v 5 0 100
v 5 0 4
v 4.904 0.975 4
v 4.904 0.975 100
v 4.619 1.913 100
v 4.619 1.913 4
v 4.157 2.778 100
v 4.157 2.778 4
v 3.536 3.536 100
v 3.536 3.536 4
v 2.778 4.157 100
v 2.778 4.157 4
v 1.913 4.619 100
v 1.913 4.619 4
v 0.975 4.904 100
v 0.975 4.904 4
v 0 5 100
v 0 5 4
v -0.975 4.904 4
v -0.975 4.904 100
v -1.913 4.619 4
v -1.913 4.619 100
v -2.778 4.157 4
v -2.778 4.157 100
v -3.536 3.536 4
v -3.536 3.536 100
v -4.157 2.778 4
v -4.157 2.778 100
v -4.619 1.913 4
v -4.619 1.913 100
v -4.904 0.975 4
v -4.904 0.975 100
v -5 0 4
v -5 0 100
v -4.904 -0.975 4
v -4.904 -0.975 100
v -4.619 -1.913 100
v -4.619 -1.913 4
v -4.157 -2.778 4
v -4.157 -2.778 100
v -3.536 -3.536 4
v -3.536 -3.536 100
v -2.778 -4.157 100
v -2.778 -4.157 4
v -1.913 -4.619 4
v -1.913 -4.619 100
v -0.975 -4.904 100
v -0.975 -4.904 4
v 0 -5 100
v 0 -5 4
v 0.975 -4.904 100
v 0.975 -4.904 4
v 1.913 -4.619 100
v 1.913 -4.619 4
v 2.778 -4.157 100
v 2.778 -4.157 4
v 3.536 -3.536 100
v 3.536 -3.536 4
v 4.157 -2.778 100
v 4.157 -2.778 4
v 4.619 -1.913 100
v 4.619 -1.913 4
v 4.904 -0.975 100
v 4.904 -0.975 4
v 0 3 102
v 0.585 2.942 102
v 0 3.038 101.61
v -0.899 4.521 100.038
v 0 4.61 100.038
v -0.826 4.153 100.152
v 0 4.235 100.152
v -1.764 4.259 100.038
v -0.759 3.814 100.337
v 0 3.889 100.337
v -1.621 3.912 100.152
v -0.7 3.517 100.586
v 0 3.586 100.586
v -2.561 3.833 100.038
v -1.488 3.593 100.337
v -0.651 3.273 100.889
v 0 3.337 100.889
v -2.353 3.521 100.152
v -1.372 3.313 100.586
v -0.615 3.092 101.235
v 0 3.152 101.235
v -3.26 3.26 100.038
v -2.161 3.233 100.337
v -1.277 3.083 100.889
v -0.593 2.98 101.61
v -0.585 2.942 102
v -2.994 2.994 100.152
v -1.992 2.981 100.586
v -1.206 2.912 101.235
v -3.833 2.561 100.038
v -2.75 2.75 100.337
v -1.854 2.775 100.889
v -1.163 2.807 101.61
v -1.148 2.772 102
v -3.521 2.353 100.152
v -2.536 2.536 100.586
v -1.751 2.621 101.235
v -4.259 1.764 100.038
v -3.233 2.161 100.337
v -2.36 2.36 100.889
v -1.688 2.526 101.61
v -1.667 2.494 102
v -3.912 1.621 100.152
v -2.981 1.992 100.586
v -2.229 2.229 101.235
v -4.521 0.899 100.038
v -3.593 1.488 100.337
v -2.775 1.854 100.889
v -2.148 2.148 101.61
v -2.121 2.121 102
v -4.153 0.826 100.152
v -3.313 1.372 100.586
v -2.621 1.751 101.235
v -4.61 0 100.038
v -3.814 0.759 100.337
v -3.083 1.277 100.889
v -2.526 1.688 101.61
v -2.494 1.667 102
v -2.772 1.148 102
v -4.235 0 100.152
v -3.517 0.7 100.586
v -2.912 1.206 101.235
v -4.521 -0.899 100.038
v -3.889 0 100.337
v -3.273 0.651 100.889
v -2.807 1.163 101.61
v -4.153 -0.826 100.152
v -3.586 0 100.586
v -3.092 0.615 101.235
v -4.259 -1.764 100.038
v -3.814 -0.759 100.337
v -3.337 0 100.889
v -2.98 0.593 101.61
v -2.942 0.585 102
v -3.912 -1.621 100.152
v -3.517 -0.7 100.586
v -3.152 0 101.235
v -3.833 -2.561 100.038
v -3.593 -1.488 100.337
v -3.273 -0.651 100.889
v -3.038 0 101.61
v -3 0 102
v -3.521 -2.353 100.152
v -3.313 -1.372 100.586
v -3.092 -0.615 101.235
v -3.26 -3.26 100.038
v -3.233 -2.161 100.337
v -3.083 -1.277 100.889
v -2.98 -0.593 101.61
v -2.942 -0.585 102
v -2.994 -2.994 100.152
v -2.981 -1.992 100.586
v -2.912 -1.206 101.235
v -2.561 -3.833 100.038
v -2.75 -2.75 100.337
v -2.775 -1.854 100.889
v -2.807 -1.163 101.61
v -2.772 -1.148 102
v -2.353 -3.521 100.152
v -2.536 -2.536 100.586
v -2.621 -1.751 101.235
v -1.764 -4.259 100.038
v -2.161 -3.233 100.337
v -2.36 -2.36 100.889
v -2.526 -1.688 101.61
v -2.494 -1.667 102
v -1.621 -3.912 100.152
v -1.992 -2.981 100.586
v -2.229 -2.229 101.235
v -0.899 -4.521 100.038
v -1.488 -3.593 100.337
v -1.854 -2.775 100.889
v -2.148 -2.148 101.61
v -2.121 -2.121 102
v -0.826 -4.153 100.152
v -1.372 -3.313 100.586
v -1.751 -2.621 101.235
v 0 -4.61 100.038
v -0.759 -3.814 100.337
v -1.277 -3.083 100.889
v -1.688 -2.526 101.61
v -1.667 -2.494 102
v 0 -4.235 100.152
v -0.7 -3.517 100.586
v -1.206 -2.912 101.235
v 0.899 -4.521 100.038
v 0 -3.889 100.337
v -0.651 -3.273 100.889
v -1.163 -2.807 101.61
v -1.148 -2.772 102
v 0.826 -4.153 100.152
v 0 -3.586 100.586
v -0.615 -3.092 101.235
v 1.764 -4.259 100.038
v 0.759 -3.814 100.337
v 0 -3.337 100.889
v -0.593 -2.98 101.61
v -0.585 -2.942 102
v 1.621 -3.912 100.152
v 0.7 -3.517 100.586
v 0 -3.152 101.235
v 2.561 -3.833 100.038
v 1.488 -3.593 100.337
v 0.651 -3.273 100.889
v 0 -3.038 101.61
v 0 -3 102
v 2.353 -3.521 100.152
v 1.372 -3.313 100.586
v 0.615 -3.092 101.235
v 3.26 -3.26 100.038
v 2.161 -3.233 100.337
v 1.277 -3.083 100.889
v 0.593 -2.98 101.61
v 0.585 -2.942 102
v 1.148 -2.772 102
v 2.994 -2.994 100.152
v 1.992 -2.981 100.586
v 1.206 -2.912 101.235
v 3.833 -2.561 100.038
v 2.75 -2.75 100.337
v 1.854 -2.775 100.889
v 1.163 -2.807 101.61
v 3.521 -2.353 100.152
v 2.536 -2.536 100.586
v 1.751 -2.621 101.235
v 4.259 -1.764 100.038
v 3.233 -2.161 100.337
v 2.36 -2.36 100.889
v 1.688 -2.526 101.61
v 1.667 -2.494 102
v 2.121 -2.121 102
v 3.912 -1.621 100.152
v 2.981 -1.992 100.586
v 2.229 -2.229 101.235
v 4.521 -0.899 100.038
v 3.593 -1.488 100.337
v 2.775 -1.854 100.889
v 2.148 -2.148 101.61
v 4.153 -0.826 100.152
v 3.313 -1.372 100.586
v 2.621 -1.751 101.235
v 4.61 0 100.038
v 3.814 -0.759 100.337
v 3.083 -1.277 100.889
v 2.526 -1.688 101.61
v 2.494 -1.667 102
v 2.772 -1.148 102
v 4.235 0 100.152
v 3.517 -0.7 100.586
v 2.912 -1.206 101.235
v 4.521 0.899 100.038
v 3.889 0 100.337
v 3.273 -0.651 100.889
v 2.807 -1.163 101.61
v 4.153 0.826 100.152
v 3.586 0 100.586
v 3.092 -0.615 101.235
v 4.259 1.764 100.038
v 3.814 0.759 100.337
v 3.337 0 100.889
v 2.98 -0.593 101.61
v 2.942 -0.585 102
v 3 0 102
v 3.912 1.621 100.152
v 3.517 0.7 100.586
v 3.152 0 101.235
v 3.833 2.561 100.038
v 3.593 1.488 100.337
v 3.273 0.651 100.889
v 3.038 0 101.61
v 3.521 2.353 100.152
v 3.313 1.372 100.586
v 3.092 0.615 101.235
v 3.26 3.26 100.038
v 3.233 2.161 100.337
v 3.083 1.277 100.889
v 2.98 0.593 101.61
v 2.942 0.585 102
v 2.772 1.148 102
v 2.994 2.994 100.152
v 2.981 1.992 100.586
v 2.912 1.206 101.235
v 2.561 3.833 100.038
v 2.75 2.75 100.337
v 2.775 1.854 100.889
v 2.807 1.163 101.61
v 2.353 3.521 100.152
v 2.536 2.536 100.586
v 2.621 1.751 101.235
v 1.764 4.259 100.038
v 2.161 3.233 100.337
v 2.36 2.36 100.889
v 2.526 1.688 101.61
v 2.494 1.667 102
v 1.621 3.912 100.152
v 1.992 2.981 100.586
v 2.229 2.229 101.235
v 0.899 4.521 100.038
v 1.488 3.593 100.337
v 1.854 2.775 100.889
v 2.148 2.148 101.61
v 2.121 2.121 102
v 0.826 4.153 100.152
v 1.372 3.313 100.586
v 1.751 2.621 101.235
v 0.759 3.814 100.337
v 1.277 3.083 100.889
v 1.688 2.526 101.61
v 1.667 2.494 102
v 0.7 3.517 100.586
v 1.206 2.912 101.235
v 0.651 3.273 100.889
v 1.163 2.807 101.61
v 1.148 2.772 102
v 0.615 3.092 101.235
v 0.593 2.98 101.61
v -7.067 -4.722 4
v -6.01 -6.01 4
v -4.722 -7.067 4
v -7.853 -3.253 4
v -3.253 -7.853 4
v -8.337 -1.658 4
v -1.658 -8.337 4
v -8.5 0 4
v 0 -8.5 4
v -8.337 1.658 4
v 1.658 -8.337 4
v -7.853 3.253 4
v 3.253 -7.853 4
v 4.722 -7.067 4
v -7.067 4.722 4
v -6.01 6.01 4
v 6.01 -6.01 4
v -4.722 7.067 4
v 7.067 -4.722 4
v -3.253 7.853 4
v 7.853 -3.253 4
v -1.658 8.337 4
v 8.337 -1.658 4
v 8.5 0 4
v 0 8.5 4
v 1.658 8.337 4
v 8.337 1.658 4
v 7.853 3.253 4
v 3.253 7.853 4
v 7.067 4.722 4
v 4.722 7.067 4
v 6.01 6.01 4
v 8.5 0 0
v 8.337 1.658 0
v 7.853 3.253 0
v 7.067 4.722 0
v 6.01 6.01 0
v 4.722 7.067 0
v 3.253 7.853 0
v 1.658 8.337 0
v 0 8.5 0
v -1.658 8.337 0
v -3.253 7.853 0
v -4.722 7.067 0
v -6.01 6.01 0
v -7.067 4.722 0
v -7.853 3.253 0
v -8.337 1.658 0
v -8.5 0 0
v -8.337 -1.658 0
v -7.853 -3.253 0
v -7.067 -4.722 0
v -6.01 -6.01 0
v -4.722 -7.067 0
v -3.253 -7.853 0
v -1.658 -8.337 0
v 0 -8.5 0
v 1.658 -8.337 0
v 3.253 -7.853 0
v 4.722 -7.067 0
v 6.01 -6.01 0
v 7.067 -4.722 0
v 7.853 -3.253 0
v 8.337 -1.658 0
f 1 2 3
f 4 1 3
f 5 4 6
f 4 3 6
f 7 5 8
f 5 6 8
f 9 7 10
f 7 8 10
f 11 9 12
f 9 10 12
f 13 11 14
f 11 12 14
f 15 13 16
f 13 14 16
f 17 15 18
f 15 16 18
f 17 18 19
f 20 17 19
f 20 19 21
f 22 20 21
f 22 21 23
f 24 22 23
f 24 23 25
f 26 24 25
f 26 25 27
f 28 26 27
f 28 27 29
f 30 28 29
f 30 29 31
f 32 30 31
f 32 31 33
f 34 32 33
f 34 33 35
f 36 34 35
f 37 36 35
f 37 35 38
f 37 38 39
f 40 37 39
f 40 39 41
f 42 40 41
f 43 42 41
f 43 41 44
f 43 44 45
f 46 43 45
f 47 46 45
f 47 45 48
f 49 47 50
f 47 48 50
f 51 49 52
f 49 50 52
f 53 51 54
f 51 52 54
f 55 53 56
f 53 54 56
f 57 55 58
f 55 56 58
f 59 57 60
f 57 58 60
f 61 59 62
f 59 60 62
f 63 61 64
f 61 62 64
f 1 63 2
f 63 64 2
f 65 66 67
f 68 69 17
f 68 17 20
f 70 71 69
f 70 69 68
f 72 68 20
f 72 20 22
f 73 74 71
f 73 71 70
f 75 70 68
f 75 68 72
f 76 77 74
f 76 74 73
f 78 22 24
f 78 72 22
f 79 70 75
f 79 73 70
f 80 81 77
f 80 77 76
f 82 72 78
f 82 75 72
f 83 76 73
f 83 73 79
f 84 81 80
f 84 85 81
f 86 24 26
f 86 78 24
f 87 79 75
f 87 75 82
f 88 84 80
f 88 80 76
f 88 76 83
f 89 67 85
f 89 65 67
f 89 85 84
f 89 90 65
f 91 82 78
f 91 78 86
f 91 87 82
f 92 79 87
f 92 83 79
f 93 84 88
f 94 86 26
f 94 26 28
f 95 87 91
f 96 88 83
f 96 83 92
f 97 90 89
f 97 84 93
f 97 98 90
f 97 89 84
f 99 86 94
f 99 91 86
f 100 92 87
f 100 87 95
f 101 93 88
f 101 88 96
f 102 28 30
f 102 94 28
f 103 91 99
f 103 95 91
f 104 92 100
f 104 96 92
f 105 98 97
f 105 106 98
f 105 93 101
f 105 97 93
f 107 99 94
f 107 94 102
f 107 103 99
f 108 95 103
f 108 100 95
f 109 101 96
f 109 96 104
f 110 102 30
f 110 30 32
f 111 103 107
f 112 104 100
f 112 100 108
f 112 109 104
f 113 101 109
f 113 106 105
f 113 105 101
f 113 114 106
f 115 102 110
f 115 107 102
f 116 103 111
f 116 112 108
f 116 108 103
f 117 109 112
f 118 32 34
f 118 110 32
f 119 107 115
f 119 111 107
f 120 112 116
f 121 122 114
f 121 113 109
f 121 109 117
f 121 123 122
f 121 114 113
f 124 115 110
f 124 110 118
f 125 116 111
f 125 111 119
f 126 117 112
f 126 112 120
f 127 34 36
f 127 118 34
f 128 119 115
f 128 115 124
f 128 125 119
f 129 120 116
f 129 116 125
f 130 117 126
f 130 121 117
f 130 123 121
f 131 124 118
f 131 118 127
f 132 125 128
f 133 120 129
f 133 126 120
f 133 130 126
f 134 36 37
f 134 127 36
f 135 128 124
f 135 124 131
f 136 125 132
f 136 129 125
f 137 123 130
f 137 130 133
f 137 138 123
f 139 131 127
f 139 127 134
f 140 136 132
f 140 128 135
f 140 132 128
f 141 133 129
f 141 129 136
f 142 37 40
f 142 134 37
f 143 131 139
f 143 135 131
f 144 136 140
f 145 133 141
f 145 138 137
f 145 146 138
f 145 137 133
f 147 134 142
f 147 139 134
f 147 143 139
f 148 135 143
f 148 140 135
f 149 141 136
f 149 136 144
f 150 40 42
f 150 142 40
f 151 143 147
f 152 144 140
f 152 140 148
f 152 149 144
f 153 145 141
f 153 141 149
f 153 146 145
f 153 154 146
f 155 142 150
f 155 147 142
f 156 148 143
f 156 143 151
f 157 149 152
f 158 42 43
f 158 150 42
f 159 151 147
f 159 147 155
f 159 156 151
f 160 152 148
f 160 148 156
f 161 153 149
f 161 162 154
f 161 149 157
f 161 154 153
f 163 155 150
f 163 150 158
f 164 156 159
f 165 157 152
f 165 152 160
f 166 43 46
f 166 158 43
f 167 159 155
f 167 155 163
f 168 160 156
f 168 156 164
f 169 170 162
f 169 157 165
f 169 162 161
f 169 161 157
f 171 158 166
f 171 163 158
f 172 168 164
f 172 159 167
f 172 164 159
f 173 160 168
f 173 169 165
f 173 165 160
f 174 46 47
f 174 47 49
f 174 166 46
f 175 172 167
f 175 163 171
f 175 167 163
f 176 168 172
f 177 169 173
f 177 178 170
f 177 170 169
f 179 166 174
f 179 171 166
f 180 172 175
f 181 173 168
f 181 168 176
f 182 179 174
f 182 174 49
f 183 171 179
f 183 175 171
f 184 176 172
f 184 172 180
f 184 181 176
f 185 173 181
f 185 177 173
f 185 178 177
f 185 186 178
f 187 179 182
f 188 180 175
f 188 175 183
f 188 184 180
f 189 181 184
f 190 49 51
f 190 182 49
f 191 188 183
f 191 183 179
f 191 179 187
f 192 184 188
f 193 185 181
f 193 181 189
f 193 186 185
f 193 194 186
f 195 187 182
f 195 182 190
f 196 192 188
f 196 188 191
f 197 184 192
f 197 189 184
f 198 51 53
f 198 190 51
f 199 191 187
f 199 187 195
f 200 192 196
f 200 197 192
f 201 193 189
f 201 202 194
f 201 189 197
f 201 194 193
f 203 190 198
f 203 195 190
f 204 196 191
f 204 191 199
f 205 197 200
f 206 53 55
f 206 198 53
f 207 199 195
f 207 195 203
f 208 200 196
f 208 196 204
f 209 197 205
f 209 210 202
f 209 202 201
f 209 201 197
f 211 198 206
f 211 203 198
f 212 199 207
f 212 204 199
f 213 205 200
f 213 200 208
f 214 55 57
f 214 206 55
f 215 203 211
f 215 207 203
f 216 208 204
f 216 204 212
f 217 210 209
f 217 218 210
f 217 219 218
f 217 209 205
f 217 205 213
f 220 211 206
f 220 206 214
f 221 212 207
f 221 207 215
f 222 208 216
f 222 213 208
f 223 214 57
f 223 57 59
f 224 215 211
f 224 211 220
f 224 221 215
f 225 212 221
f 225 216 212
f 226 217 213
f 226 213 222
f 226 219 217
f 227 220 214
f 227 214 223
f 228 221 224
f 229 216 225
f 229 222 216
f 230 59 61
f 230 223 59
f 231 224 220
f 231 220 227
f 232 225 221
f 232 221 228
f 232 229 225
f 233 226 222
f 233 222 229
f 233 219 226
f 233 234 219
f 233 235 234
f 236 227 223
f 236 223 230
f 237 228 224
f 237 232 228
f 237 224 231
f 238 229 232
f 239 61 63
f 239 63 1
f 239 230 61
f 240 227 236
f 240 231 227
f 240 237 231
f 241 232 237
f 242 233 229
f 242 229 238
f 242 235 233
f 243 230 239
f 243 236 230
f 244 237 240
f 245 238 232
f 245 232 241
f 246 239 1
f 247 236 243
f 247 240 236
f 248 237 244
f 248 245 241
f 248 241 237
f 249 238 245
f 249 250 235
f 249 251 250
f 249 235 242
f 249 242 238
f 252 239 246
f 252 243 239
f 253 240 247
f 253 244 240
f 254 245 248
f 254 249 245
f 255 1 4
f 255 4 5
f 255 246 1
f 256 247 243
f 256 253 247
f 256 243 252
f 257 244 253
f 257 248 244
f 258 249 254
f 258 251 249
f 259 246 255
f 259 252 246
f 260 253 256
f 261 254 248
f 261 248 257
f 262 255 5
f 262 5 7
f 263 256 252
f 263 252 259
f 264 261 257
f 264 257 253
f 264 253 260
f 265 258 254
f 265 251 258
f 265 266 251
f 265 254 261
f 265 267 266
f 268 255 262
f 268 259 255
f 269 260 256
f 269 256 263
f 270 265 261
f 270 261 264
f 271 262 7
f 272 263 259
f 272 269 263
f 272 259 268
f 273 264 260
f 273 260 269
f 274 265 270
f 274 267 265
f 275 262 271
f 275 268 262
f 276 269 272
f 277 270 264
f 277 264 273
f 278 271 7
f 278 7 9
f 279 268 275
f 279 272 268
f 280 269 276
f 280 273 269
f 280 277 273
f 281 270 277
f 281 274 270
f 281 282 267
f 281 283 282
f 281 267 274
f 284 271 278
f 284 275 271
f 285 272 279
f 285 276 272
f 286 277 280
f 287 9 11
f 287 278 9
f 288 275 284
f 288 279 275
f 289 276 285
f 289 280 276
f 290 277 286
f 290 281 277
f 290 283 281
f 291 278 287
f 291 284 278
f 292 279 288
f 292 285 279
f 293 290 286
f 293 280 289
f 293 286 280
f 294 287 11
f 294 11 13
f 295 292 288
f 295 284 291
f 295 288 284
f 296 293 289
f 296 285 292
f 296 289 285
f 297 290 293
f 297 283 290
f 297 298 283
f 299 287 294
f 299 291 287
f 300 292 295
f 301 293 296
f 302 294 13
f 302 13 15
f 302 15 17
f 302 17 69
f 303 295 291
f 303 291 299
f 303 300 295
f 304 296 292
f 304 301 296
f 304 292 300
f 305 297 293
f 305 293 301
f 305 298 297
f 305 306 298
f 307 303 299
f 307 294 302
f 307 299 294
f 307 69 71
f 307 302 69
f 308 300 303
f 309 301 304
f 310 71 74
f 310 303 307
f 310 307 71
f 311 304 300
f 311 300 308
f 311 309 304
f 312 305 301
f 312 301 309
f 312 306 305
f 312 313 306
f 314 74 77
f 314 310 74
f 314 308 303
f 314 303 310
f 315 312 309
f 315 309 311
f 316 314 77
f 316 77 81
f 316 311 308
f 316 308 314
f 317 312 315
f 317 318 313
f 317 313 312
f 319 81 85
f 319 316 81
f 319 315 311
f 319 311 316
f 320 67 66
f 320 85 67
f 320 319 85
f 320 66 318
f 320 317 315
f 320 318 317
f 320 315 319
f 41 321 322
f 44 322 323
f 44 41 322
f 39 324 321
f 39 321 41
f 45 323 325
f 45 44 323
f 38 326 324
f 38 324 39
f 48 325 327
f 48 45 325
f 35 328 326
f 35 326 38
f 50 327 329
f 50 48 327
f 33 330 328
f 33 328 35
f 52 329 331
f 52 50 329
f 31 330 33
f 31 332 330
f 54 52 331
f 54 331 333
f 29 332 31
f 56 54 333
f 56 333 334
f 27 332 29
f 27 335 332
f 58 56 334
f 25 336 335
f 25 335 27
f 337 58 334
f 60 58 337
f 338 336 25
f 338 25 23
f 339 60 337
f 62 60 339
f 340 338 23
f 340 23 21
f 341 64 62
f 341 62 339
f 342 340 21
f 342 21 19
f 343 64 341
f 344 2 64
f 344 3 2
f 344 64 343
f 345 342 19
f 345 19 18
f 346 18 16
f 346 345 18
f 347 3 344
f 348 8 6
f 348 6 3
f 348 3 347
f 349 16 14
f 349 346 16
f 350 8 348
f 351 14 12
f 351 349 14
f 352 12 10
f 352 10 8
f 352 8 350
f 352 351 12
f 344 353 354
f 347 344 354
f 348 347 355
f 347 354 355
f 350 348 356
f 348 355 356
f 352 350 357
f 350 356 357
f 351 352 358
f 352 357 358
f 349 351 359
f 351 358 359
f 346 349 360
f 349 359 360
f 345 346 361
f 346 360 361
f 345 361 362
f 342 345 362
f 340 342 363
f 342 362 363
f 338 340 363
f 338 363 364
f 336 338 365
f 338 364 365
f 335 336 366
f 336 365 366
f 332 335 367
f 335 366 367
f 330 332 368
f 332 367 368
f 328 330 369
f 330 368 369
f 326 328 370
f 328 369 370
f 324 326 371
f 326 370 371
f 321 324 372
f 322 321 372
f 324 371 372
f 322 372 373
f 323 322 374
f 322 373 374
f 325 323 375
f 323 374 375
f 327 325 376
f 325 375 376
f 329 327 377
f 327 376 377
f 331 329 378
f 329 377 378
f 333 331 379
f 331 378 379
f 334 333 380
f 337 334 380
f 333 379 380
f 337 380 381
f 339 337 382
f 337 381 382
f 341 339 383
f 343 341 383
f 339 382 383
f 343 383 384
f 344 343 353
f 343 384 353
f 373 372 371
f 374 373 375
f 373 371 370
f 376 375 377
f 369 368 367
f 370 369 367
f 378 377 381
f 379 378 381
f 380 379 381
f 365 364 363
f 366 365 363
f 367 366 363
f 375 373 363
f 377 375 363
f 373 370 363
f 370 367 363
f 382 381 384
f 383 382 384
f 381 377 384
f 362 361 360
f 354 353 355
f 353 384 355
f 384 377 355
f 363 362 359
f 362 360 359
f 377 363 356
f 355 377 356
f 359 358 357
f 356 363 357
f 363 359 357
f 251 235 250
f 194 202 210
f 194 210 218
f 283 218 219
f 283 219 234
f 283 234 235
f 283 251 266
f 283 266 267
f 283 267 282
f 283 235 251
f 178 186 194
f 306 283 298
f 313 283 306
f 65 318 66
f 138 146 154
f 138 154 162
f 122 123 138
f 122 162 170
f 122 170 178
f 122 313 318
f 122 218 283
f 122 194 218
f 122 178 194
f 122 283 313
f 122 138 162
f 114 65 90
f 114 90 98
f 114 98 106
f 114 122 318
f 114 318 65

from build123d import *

# Parameters (mm, degrees)
F0_R     = 8.5
F1_DEPTH = 4
F2_R     = 5
F3_DEPTH = 100


with BuildPart() as f1:
    # F0 (on Top) → F1 (new body)
    with BuildSketch(Plane.XY):
        Circle(F0_R)
    extrude(amount=F1_DEPTH)

    # F2 (on Top) → F3 (join)
    with BuildSketch(Plane.XY):
        Circle(F2_R)
    extrude(amount=F3_DEPTH)

    # F4 (on Right) → F5 (revolve)
    with BuildSketch(Plane.YZ):
        with BuildLine():
            Line((0, 102), (0, 100))
            Line((0, 100), (5, 100))
            ThreePointArc((5, 100), (3.585786, 100.585786), (3, 102))
            Line((3, 102), (0, 102))
        make_face()
    revolve(axis=Axis((0, 0, 101), (0, 0, 1)))


solid = f1.part
